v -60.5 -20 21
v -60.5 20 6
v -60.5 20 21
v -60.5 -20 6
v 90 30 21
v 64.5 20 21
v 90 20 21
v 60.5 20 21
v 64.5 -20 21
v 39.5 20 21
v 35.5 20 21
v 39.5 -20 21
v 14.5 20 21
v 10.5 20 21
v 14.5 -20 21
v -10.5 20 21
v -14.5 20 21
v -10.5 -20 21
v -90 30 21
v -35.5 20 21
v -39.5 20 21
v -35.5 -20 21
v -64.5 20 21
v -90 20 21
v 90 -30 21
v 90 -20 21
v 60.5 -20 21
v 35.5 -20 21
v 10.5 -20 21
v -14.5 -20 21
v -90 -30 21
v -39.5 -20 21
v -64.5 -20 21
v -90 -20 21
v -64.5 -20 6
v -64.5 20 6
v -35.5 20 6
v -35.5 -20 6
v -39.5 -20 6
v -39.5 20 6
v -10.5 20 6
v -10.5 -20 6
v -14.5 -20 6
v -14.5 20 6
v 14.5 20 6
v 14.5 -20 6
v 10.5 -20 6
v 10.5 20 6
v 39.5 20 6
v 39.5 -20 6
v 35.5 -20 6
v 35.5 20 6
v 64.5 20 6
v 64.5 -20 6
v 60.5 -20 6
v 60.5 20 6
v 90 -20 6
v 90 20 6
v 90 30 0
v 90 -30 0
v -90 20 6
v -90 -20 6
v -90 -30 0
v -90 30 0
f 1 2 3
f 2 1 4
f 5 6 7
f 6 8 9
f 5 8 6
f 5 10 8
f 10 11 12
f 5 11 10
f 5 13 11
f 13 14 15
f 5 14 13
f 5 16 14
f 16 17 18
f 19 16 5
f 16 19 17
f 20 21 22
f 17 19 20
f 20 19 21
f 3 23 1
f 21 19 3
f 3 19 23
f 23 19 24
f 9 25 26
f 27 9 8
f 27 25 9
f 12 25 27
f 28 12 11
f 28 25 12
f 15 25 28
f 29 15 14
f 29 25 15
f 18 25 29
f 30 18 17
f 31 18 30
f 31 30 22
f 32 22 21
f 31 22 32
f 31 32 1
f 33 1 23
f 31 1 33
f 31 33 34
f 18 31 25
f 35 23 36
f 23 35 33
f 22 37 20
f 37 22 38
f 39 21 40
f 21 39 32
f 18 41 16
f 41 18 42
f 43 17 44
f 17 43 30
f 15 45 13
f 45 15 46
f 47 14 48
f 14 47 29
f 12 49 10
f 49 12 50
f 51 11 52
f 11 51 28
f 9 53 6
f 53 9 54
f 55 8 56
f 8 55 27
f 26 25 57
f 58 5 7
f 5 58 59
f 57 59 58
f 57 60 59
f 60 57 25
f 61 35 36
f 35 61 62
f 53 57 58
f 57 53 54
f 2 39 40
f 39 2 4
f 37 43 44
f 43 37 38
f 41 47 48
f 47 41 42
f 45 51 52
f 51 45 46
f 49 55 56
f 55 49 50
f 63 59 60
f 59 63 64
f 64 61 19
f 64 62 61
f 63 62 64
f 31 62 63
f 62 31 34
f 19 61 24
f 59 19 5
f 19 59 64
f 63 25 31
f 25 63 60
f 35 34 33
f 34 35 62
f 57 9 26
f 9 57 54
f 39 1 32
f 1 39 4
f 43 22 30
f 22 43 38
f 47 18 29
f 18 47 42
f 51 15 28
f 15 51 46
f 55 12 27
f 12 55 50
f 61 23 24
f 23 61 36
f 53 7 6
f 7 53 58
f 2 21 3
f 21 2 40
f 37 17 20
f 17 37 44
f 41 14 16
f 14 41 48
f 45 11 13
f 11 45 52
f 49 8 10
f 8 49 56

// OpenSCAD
$fn = 32;

// ----------------------------------------------------------------------
// Rib frame 180 x 60 x 21
// 6 ribs at 25 mm pitch
// ----------------------------------------------------------------------

// --- parameters (mm) ---
frame = [180, 60, 6];  // base plate size (x, y, z)
rail_w = 10;           // side rail width
ribs = 6;              // number of ribs
rib_t = 4;             // rib thickness
rib_h = 15;            // rib height above the base plate
pitch = 25;            // pitch between rib centres

// --- derived feature positions (mm) ---
span = (ribs - 1) * pitch;          // = 125   distance between the outer ribs
origin_x = -span / 2;               // = -62.5   X of the first rib
rib_len = frame[1] - 2 * rail_w + 2;  // = 42   rib length, 1 mm into each rail
feature_centers = [
  [origin_x + 0 * pitch, 0],
  [origin_x + 1 * pitch, 0],
  [origin_x + 2 * pitch, 0],
  [origin_x + 3 * pitch, 0],
  [origin_x + 4 * pitch, 0],
  [origin_x + 5 * pitch, 0]
];   // rib centre line, drives the rib loop

// base plate, two side rails, then the ribs read straight off feature_centers
union() {
  translate([-frame[0] / 2, -frame[1] / 2, 0]) cube(frame);
  translate([-frame[0] / 2, -frame[1] / 2, 0]) cube([frame[0], rail_w, frame[2] + rib_h]);
  translate([-frame[0] / 2, frame[1] / 2 - rail_w, 0]) cube([frame[0], rail_w, frame[2] + rib_h]);
  for (centre = feature_centers)
    translate([centre[0] - rib_t / 2, centre[1] - rib_len / 2, frame[2] - 1])
      cube([rib_t, rib_len, rib_h + 1]);
}
